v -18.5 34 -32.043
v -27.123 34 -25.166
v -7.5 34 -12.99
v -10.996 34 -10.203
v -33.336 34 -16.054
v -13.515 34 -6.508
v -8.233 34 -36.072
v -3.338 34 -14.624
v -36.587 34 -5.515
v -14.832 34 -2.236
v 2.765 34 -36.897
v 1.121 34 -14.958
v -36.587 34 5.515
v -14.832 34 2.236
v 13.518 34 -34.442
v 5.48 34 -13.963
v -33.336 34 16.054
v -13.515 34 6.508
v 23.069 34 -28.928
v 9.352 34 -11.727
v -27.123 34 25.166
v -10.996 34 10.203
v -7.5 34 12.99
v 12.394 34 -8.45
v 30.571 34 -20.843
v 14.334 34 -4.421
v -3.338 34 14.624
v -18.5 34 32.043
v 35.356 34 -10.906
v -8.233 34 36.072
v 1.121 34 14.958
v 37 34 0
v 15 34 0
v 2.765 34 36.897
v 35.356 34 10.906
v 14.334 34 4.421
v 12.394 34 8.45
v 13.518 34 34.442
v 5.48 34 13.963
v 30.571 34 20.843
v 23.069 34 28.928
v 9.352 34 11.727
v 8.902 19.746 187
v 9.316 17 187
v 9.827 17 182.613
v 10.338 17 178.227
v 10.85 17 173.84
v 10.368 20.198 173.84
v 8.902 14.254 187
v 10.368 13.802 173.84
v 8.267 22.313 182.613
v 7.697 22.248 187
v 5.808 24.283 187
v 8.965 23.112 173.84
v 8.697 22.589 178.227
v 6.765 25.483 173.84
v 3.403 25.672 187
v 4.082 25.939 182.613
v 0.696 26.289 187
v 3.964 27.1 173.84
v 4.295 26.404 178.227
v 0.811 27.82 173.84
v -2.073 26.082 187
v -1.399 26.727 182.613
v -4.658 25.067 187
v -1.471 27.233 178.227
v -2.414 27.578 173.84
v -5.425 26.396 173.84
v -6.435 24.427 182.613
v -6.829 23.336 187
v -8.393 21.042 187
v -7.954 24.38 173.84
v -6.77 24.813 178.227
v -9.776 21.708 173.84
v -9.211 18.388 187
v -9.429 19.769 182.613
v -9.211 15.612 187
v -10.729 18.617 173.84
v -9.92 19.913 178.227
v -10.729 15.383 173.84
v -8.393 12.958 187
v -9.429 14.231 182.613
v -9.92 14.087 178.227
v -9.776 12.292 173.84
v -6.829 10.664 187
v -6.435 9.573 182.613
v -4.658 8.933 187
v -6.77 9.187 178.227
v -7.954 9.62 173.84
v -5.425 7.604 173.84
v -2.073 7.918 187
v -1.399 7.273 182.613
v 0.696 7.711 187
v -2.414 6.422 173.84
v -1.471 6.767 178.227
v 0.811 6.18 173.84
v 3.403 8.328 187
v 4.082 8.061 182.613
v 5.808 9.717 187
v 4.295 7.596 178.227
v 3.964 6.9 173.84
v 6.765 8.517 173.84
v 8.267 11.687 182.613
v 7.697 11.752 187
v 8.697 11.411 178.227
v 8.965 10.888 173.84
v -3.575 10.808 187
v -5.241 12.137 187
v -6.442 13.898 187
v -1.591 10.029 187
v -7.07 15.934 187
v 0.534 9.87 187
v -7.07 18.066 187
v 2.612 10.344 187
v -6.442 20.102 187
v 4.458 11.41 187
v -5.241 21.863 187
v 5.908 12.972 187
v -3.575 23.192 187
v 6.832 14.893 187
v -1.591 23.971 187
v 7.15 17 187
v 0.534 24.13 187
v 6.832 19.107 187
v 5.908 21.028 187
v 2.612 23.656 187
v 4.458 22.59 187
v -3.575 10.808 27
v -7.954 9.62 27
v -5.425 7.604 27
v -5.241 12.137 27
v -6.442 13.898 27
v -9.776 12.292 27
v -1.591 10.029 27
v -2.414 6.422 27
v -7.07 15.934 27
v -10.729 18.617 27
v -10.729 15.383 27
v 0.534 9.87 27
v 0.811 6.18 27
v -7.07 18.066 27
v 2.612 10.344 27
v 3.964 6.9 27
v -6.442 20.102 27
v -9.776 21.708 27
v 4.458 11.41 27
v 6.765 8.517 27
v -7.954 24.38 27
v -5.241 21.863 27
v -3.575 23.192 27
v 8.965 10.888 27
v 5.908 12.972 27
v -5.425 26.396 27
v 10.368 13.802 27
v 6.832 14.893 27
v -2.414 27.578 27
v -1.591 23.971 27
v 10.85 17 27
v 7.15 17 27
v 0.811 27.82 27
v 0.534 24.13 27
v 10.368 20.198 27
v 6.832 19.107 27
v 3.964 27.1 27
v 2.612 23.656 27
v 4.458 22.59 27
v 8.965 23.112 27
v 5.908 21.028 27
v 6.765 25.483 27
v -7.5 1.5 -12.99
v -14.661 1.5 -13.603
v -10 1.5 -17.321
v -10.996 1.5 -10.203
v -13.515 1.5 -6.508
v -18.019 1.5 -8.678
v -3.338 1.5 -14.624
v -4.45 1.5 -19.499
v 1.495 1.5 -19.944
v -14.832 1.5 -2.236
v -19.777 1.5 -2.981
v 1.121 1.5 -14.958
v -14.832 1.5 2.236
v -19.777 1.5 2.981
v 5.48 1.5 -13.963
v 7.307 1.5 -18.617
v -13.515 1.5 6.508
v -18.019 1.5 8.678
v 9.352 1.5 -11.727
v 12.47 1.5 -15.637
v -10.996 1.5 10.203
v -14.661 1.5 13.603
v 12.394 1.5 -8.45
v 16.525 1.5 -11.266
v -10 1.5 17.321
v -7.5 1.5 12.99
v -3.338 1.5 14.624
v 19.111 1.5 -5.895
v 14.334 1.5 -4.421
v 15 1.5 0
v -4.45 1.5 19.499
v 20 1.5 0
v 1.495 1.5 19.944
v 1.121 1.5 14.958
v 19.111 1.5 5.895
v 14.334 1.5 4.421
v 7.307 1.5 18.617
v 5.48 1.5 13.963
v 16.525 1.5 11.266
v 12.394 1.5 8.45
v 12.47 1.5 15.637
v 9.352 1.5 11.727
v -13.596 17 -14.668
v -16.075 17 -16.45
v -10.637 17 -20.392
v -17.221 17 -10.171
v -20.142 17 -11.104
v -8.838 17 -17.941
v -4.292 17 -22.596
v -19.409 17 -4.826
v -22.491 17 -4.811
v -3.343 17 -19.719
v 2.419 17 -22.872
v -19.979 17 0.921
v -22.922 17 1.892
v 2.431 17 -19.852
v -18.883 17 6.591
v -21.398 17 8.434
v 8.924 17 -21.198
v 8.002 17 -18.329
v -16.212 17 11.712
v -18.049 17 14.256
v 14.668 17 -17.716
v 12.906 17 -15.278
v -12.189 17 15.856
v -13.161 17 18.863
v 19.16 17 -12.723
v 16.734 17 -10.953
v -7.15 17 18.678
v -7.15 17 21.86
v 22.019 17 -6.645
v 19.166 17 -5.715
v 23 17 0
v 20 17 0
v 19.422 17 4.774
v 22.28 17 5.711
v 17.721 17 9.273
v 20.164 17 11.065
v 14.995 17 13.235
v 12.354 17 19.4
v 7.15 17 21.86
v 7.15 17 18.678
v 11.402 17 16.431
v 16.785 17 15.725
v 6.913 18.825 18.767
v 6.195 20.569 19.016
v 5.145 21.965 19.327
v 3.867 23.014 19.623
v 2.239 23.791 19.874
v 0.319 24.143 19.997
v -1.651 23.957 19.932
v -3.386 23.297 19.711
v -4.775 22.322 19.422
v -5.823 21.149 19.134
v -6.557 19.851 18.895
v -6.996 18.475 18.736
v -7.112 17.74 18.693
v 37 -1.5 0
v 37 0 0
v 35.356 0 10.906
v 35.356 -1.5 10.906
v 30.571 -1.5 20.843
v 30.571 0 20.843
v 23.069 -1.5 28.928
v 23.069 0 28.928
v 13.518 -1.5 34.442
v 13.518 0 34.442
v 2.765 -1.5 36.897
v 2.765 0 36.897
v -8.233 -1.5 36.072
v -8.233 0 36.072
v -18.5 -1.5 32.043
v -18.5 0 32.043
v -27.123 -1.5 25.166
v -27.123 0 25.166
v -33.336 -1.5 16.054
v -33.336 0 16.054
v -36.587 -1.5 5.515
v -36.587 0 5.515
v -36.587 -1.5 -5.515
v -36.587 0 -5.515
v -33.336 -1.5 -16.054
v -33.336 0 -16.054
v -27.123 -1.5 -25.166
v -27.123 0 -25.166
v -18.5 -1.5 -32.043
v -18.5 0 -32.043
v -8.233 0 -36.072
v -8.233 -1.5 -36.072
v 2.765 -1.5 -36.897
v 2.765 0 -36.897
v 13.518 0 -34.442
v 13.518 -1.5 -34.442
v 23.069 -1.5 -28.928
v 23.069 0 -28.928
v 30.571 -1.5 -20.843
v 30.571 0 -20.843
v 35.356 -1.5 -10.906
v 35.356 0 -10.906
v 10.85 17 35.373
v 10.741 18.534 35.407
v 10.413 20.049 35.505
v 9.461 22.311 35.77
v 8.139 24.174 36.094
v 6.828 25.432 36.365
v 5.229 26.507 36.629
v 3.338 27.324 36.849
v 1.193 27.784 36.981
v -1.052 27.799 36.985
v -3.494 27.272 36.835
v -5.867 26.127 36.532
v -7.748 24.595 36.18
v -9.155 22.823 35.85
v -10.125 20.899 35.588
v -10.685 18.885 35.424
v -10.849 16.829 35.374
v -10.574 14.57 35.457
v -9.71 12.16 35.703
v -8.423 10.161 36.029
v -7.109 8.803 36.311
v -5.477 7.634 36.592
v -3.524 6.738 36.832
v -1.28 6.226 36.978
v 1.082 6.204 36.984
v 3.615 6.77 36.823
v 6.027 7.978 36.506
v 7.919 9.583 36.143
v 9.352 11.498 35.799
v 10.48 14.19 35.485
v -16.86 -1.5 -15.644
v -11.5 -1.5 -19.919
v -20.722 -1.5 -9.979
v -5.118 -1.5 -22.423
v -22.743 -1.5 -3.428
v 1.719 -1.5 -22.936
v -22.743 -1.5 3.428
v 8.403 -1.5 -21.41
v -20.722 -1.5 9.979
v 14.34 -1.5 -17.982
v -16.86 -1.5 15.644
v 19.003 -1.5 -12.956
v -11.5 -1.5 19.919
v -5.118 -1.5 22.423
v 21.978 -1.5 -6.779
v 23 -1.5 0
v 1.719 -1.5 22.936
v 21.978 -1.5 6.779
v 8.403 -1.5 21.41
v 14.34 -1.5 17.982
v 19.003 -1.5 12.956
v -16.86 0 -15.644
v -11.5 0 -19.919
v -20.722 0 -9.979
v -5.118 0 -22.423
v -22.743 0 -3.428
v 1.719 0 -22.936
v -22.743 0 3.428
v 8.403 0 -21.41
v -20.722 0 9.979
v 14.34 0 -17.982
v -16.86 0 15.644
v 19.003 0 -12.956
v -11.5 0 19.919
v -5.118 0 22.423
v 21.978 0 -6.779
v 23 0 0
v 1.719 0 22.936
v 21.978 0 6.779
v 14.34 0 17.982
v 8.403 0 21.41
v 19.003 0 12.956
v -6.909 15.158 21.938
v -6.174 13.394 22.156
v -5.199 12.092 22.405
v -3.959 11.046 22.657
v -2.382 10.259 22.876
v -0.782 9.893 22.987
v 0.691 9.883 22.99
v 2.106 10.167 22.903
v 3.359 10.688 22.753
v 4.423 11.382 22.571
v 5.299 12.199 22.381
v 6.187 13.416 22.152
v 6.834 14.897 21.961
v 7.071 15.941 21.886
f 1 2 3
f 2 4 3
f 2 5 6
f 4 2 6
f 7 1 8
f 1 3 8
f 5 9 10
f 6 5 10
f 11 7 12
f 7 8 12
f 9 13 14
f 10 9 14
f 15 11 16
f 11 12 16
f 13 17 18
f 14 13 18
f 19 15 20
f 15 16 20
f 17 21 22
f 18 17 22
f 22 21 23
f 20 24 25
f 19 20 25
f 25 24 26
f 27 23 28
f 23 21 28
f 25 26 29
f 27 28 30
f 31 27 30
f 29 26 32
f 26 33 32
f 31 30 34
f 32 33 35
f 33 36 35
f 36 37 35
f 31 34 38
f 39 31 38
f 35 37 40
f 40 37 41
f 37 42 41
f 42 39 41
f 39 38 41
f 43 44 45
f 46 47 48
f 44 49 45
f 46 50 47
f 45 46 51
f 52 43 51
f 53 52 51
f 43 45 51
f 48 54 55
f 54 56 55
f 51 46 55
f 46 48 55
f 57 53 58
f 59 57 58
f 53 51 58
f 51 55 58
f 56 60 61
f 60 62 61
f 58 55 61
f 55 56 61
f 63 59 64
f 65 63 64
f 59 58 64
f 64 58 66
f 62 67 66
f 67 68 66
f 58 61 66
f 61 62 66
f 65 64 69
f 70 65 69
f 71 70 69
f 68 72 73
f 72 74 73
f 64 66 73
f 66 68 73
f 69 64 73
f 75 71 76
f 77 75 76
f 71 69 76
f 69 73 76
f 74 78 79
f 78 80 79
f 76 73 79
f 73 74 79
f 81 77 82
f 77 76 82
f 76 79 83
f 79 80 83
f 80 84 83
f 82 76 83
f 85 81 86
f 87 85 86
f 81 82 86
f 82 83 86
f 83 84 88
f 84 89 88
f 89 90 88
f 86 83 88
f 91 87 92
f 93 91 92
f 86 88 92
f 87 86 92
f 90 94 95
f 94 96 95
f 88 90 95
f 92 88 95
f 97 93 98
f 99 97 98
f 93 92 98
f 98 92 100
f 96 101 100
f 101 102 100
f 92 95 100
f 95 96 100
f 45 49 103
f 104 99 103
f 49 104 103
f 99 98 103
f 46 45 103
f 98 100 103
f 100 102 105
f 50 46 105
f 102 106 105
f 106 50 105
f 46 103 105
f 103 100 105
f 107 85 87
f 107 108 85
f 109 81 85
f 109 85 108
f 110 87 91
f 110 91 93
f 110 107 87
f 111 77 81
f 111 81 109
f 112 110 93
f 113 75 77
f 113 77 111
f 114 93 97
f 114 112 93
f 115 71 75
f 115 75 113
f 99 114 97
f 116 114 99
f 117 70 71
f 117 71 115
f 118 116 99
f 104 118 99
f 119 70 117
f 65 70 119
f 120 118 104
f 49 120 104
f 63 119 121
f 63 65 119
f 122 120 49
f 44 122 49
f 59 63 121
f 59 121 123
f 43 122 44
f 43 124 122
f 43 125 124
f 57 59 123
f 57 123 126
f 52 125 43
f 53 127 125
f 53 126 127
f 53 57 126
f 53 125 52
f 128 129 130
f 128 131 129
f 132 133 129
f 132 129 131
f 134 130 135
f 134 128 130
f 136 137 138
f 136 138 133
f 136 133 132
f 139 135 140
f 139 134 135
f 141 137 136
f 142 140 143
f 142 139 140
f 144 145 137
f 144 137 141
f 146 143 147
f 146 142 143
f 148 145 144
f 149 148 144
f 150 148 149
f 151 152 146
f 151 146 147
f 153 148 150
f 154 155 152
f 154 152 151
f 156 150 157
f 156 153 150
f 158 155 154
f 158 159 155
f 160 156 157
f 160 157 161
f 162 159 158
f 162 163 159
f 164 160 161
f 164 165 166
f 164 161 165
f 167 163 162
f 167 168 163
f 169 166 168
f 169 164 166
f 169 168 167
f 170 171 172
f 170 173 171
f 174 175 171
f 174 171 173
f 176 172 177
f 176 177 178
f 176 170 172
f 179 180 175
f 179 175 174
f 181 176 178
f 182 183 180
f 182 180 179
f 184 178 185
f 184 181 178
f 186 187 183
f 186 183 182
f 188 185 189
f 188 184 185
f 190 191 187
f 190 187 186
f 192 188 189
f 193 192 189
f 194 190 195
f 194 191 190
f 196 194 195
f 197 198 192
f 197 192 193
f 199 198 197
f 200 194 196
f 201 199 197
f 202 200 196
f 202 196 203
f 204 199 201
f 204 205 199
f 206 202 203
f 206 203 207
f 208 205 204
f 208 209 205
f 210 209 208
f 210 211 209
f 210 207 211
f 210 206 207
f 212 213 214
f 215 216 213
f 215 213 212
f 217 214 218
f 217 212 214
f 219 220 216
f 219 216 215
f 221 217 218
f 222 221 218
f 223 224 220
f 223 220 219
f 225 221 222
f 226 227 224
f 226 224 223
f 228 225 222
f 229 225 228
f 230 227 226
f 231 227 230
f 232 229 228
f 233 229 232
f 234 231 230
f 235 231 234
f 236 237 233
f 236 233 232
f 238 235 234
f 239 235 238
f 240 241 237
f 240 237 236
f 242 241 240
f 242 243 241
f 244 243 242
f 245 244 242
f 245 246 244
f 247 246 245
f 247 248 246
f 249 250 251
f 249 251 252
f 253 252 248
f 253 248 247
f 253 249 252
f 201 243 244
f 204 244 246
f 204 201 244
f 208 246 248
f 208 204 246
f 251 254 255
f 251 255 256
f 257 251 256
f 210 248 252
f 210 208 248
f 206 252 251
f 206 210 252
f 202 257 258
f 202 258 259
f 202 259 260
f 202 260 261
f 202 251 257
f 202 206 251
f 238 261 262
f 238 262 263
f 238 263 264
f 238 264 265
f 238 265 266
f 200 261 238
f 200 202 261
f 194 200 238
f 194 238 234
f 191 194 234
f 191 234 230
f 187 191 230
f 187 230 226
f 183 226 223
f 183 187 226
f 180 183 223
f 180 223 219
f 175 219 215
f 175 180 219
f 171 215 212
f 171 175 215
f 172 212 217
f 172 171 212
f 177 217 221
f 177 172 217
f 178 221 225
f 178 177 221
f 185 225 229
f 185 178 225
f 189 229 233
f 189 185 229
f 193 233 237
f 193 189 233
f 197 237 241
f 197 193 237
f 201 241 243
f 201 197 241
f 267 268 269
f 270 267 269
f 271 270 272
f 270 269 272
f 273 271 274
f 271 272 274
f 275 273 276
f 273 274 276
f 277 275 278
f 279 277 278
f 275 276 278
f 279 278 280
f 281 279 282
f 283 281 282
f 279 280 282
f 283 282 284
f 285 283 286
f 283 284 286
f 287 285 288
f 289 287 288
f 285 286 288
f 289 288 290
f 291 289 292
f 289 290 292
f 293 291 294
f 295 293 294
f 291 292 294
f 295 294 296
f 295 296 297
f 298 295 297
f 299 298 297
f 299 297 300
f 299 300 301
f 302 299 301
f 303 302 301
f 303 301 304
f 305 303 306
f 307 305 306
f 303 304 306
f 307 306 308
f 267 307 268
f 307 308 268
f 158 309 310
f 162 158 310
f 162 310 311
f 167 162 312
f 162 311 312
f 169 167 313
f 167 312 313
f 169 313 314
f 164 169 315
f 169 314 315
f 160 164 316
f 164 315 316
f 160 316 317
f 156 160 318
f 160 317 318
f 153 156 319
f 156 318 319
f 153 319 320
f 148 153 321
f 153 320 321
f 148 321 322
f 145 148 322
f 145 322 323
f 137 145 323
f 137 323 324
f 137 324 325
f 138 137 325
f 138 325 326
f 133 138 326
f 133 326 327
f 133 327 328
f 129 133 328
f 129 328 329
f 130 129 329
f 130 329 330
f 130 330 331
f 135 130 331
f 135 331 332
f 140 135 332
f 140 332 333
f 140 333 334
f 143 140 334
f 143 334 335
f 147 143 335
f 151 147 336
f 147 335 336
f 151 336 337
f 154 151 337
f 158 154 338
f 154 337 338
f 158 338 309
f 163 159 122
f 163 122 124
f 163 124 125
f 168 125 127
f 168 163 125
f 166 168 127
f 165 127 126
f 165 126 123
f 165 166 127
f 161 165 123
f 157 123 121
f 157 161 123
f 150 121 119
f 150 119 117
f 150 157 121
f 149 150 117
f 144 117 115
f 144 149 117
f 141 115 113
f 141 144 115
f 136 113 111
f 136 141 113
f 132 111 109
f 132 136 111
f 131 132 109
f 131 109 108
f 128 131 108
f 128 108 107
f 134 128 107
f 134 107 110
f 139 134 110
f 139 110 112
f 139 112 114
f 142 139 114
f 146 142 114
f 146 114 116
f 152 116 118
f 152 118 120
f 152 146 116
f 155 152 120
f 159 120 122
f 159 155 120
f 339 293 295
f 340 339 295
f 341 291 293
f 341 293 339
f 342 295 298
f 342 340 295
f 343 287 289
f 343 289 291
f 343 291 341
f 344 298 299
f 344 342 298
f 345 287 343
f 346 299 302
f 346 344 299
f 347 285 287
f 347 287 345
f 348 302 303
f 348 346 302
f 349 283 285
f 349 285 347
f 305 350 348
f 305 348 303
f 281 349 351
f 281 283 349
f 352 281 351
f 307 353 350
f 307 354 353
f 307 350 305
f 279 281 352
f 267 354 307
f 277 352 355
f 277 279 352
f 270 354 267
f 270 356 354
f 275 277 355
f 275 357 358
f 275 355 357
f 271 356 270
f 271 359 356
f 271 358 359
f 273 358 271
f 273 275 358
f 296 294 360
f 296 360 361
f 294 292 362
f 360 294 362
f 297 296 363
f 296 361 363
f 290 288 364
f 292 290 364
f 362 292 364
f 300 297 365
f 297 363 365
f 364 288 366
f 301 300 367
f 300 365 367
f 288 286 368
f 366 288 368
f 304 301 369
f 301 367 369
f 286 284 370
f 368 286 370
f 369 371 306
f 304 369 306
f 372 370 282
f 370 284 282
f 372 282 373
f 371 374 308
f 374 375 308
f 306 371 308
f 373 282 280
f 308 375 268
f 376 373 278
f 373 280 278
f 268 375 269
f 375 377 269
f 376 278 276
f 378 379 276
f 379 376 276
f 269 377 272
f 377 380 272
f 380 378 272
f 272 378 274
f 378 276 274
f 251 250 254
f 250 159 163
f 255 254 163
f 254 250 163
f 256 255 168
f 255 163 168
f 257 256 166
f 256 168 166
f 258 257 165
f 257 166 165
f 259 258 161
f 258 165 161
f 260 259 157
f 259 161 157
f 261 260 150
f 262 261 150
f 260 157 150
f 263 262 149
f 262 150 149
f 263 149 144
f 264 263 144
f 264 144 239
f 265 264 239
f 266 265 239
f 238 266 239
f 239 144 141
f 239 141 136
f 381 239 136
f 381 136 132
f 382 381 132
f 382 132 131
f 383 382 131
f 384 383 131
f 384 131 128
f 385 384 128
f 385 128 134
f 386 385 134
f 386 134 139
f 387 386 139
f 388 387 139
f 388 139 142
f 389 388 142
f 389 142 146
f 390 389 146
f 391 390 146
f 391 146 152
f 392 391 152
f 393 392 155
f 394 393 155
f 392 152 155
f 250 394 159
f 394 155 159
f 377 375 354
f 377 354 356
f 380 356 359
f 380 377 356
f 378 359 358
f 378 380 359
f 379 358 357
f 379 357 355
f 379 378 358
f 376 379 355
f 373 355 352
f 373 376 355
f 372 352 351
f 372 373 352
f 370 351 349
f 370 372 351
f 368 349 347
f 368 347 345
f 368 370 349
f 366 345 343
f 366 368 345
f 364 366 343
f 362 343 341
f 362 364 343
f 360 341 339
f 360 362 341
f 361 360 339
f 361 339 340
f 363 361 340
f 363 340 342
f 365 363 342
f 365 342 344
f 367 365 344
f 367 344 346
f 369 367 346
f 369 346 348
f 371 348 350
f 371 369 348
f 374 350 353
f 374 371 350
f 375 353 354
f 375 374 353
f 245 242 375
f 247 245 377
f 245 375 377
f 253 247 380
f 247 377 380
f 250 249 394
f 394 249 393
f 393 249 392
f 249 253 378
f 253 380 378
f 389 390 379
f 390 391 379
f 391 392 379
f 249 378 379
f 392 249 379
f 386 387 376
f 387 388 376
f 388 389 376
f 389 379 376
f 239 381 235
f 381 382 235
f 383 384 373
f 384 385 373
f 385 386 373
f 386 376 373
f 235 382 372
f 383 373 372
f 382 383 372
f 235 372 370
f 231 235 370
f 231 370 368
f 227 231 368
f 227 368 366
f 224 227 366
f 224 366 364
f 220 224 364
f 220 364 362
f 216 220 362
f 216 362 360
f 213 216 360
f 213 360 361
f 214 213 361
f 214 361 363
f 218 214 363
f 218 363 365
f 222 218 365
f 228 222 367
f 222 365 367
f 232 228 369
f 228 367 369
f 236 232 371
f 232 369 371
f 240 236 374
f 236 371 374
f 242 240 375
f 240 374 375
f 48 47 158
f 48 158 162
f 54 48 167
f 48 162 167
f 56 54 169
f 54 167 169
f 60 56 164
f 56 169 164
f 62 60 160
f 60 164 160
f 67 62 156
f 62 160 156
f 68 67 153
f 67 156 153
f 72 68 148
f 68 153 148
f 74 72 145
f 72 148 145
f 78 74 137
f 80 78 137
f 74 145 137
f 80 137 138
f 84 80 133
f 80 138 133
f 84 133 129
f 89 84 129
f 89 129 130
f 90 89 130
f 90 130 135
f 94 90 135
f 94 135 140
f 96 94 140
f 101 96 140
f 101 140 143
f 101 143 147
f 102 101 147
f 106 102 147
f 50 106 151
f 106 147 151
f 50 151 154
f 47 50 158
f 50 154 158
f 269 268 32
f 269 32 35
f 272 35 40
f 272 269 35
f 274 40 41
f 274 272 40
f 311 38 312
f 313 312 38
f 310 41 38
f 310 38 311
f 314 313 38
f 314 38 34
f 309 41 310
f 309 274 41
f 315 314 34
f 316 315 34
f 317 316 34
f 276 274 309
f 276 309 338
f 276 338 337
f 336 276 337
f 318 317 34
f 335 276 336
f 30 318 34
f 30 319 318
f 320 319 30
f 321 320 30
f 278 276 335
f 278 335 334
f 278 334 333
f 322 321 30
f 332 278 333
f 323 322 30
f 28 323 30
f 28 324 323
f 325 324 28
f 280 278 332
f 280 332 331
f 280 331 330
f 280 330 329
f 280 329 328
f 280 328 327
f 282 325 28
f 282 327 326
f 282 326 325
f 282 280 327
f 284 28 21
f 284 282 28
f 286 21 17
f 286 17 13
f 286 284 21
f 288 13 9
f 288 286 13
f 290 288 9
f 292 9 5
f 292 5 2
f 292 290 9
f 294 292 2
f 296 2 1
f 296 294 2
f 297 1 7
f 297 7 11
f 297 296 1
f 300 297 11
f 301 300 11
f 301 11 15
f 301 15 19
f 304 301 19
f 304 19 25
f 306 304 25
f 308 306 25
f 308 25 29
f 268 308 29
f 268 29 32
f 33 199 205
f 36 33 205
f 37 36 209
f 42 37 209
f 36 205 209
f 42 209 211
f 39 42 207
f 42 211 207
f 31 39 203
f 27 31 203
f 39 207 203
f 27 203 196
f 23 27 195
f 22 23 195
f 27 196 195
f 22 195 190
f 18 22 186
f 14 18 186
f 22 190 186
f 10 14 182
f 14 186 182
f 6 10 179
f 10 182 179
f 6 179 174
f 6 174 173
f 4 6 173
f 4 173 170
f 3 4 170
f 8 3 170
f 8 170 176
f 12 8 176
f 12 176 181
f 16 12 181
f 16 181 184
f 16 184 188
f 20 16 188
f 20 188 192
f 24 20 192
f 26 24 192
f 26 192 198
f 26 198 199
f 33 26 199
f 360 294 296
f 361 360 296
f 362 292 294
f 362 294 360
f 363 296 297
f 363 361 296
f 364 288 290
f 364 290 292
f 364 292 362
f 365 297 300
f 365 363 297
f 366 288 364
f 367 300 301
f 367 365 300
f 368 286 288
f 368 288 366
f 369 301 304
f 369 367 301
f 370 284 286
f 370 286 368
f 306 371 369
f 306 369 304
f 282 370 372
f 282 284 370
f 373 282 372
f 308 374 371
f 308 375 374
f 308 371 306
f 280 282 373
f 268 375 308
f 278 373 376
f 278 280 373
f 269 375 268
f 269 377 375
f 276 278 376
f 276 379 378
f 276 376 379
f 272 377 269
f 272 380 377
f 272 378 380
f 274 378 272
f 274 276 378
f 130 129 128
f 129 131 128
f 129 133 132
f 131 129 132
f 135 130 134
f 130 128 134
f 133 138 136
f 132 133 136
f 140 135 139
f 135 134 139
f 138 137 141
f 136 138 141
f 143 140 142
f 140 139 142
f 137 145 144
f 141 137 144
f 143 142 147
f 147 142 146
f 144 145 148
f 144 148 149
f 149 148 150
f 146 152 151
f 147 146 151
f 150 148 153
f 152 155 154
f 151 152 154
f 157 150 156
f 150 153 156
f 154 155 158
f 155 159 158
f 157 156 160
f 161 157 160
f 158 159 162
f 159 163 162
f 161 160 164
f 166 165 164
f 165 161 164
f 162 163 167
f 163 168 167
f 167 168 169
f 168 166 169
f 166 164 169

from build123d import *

# Parameters (mm, degrees)
F0_R          = 37
F0_R_2        = 15
F1_DEPTH      = 34
F2_R          = 23
F2_R_2        = 15
F3_DEPTH      = 1.5
F4_R          = 23
F4_R_2        = 20
F5_DEPTH      = 17
F8_END_RADIUS = 20
F7_R          = 7.15
F8_REACH      = 94.2242539419
F9_R          = 10.85
F10_DEPTH     = 10
F11_R         = 10.85
F11_R_2       = 7.15
F12_DEPTH     = 160
F13_SIZE2     = 13.16
F13_SIZE      = 1.5345
F14_R         = 37
F14_R_2       = 23
F15_DEPTH     = 1.5


with BuildPart() as f1:
    # F0 (on Front) → F1 (new body)
    with BuildSketch(Plane.XZ):
        Circle(F0_R)
        Circle(F0_R_2, mode=Mode.SUBTRACT)
    extrude(amount=-F1_DEPTH)

    # F2 (on face) → F3 (cut)
    with BuildSketch(Plane.XZ):
        Circle(F2_R)
        Circle(F2_R_2, mode=Mode.SUBTRACT)
    extrude(amount=-F3_DEPTH, mode=Mode.SUBTRACT)

    # F4 (on face) → F5 (cut)
    with BuildSketch(Plane.XZ):
        Circle(F4_R)
        Circle(F4_R_2, mode=Mode.SUBTRACT)
    extrude(amount=-F5_DEPTH, mode=Mode.SUBTRACT)

    f8_end = (Plane(origin=(0, 9.25, 0), x_dir=(0, 0, -1), z_dir=(0, -1, 0)) * Cylinder(F8_END_RADIUS, 408.5212231395, mode=Mode.PRIVATE)).faces().sort_by_distance((-20, 9.25, 0))[0]
    # F7 (on offset) → F8 (cut, up to the whole of a round face its end follows)
    with BuildSketch(Plane.XY.offset(37)):
        with Locations((0, 17)):
            Circle(F7_R)
    f8_long = extrude(amount=-F8_REACH, mode=Mode.PRIVATE)
    add(split(f8_long, bisect_by=f8_end, keep=Keep.ALL, mode=Mode.PRIVATE).solids().sort_by_distance((0, 17, 37))[0], mode=Mode.SUBTRACT)

    # F9 (on offset) → F10 (cut)
    with BuildSketch(Plane.XY.offset(37)):
        with Locations((0, 17)):
            Circle(F9_R)
    extrude(amount=-F10_DEPTH, mode=Mode.SUBTRACT)


with BuildPart() as f12:
    # F11 (on face) → F12 (new body)
    with BuildSketch(Plane.XY.offset(27)):
        with Locations((0, 17)):
            Circle(F11_R)
        with Locations((0, 17)):
            Circle(F11_R_2, mode=Mode.SUBTRACT)
    extrude(amount=F12_DEPTH)

    # F13
    f13_edges = [f12.edges().sort_by_distance(p)[0] for p in [
        (-10.85, 17, 187),
    ]]
    f13_side = f12.faces().sort_by_distance((-10.543116, 17, 187))[0]
    chamfer(f13_edges, length=F13_SIZE, length2=F13_SIZE2, reference=f13_side)


with BuildPart() as f15:
    # F14 (on face) → F15 (new body)
    with BuildSketch(Plane.XZ):
        Circle(F14_R)
        Circle(F14_R_2, mode=Mode.SUBTRACT)
    extrude(amount=F15_DEPTH)


solid = Compound([f1.part, f12.part, f15.part])
